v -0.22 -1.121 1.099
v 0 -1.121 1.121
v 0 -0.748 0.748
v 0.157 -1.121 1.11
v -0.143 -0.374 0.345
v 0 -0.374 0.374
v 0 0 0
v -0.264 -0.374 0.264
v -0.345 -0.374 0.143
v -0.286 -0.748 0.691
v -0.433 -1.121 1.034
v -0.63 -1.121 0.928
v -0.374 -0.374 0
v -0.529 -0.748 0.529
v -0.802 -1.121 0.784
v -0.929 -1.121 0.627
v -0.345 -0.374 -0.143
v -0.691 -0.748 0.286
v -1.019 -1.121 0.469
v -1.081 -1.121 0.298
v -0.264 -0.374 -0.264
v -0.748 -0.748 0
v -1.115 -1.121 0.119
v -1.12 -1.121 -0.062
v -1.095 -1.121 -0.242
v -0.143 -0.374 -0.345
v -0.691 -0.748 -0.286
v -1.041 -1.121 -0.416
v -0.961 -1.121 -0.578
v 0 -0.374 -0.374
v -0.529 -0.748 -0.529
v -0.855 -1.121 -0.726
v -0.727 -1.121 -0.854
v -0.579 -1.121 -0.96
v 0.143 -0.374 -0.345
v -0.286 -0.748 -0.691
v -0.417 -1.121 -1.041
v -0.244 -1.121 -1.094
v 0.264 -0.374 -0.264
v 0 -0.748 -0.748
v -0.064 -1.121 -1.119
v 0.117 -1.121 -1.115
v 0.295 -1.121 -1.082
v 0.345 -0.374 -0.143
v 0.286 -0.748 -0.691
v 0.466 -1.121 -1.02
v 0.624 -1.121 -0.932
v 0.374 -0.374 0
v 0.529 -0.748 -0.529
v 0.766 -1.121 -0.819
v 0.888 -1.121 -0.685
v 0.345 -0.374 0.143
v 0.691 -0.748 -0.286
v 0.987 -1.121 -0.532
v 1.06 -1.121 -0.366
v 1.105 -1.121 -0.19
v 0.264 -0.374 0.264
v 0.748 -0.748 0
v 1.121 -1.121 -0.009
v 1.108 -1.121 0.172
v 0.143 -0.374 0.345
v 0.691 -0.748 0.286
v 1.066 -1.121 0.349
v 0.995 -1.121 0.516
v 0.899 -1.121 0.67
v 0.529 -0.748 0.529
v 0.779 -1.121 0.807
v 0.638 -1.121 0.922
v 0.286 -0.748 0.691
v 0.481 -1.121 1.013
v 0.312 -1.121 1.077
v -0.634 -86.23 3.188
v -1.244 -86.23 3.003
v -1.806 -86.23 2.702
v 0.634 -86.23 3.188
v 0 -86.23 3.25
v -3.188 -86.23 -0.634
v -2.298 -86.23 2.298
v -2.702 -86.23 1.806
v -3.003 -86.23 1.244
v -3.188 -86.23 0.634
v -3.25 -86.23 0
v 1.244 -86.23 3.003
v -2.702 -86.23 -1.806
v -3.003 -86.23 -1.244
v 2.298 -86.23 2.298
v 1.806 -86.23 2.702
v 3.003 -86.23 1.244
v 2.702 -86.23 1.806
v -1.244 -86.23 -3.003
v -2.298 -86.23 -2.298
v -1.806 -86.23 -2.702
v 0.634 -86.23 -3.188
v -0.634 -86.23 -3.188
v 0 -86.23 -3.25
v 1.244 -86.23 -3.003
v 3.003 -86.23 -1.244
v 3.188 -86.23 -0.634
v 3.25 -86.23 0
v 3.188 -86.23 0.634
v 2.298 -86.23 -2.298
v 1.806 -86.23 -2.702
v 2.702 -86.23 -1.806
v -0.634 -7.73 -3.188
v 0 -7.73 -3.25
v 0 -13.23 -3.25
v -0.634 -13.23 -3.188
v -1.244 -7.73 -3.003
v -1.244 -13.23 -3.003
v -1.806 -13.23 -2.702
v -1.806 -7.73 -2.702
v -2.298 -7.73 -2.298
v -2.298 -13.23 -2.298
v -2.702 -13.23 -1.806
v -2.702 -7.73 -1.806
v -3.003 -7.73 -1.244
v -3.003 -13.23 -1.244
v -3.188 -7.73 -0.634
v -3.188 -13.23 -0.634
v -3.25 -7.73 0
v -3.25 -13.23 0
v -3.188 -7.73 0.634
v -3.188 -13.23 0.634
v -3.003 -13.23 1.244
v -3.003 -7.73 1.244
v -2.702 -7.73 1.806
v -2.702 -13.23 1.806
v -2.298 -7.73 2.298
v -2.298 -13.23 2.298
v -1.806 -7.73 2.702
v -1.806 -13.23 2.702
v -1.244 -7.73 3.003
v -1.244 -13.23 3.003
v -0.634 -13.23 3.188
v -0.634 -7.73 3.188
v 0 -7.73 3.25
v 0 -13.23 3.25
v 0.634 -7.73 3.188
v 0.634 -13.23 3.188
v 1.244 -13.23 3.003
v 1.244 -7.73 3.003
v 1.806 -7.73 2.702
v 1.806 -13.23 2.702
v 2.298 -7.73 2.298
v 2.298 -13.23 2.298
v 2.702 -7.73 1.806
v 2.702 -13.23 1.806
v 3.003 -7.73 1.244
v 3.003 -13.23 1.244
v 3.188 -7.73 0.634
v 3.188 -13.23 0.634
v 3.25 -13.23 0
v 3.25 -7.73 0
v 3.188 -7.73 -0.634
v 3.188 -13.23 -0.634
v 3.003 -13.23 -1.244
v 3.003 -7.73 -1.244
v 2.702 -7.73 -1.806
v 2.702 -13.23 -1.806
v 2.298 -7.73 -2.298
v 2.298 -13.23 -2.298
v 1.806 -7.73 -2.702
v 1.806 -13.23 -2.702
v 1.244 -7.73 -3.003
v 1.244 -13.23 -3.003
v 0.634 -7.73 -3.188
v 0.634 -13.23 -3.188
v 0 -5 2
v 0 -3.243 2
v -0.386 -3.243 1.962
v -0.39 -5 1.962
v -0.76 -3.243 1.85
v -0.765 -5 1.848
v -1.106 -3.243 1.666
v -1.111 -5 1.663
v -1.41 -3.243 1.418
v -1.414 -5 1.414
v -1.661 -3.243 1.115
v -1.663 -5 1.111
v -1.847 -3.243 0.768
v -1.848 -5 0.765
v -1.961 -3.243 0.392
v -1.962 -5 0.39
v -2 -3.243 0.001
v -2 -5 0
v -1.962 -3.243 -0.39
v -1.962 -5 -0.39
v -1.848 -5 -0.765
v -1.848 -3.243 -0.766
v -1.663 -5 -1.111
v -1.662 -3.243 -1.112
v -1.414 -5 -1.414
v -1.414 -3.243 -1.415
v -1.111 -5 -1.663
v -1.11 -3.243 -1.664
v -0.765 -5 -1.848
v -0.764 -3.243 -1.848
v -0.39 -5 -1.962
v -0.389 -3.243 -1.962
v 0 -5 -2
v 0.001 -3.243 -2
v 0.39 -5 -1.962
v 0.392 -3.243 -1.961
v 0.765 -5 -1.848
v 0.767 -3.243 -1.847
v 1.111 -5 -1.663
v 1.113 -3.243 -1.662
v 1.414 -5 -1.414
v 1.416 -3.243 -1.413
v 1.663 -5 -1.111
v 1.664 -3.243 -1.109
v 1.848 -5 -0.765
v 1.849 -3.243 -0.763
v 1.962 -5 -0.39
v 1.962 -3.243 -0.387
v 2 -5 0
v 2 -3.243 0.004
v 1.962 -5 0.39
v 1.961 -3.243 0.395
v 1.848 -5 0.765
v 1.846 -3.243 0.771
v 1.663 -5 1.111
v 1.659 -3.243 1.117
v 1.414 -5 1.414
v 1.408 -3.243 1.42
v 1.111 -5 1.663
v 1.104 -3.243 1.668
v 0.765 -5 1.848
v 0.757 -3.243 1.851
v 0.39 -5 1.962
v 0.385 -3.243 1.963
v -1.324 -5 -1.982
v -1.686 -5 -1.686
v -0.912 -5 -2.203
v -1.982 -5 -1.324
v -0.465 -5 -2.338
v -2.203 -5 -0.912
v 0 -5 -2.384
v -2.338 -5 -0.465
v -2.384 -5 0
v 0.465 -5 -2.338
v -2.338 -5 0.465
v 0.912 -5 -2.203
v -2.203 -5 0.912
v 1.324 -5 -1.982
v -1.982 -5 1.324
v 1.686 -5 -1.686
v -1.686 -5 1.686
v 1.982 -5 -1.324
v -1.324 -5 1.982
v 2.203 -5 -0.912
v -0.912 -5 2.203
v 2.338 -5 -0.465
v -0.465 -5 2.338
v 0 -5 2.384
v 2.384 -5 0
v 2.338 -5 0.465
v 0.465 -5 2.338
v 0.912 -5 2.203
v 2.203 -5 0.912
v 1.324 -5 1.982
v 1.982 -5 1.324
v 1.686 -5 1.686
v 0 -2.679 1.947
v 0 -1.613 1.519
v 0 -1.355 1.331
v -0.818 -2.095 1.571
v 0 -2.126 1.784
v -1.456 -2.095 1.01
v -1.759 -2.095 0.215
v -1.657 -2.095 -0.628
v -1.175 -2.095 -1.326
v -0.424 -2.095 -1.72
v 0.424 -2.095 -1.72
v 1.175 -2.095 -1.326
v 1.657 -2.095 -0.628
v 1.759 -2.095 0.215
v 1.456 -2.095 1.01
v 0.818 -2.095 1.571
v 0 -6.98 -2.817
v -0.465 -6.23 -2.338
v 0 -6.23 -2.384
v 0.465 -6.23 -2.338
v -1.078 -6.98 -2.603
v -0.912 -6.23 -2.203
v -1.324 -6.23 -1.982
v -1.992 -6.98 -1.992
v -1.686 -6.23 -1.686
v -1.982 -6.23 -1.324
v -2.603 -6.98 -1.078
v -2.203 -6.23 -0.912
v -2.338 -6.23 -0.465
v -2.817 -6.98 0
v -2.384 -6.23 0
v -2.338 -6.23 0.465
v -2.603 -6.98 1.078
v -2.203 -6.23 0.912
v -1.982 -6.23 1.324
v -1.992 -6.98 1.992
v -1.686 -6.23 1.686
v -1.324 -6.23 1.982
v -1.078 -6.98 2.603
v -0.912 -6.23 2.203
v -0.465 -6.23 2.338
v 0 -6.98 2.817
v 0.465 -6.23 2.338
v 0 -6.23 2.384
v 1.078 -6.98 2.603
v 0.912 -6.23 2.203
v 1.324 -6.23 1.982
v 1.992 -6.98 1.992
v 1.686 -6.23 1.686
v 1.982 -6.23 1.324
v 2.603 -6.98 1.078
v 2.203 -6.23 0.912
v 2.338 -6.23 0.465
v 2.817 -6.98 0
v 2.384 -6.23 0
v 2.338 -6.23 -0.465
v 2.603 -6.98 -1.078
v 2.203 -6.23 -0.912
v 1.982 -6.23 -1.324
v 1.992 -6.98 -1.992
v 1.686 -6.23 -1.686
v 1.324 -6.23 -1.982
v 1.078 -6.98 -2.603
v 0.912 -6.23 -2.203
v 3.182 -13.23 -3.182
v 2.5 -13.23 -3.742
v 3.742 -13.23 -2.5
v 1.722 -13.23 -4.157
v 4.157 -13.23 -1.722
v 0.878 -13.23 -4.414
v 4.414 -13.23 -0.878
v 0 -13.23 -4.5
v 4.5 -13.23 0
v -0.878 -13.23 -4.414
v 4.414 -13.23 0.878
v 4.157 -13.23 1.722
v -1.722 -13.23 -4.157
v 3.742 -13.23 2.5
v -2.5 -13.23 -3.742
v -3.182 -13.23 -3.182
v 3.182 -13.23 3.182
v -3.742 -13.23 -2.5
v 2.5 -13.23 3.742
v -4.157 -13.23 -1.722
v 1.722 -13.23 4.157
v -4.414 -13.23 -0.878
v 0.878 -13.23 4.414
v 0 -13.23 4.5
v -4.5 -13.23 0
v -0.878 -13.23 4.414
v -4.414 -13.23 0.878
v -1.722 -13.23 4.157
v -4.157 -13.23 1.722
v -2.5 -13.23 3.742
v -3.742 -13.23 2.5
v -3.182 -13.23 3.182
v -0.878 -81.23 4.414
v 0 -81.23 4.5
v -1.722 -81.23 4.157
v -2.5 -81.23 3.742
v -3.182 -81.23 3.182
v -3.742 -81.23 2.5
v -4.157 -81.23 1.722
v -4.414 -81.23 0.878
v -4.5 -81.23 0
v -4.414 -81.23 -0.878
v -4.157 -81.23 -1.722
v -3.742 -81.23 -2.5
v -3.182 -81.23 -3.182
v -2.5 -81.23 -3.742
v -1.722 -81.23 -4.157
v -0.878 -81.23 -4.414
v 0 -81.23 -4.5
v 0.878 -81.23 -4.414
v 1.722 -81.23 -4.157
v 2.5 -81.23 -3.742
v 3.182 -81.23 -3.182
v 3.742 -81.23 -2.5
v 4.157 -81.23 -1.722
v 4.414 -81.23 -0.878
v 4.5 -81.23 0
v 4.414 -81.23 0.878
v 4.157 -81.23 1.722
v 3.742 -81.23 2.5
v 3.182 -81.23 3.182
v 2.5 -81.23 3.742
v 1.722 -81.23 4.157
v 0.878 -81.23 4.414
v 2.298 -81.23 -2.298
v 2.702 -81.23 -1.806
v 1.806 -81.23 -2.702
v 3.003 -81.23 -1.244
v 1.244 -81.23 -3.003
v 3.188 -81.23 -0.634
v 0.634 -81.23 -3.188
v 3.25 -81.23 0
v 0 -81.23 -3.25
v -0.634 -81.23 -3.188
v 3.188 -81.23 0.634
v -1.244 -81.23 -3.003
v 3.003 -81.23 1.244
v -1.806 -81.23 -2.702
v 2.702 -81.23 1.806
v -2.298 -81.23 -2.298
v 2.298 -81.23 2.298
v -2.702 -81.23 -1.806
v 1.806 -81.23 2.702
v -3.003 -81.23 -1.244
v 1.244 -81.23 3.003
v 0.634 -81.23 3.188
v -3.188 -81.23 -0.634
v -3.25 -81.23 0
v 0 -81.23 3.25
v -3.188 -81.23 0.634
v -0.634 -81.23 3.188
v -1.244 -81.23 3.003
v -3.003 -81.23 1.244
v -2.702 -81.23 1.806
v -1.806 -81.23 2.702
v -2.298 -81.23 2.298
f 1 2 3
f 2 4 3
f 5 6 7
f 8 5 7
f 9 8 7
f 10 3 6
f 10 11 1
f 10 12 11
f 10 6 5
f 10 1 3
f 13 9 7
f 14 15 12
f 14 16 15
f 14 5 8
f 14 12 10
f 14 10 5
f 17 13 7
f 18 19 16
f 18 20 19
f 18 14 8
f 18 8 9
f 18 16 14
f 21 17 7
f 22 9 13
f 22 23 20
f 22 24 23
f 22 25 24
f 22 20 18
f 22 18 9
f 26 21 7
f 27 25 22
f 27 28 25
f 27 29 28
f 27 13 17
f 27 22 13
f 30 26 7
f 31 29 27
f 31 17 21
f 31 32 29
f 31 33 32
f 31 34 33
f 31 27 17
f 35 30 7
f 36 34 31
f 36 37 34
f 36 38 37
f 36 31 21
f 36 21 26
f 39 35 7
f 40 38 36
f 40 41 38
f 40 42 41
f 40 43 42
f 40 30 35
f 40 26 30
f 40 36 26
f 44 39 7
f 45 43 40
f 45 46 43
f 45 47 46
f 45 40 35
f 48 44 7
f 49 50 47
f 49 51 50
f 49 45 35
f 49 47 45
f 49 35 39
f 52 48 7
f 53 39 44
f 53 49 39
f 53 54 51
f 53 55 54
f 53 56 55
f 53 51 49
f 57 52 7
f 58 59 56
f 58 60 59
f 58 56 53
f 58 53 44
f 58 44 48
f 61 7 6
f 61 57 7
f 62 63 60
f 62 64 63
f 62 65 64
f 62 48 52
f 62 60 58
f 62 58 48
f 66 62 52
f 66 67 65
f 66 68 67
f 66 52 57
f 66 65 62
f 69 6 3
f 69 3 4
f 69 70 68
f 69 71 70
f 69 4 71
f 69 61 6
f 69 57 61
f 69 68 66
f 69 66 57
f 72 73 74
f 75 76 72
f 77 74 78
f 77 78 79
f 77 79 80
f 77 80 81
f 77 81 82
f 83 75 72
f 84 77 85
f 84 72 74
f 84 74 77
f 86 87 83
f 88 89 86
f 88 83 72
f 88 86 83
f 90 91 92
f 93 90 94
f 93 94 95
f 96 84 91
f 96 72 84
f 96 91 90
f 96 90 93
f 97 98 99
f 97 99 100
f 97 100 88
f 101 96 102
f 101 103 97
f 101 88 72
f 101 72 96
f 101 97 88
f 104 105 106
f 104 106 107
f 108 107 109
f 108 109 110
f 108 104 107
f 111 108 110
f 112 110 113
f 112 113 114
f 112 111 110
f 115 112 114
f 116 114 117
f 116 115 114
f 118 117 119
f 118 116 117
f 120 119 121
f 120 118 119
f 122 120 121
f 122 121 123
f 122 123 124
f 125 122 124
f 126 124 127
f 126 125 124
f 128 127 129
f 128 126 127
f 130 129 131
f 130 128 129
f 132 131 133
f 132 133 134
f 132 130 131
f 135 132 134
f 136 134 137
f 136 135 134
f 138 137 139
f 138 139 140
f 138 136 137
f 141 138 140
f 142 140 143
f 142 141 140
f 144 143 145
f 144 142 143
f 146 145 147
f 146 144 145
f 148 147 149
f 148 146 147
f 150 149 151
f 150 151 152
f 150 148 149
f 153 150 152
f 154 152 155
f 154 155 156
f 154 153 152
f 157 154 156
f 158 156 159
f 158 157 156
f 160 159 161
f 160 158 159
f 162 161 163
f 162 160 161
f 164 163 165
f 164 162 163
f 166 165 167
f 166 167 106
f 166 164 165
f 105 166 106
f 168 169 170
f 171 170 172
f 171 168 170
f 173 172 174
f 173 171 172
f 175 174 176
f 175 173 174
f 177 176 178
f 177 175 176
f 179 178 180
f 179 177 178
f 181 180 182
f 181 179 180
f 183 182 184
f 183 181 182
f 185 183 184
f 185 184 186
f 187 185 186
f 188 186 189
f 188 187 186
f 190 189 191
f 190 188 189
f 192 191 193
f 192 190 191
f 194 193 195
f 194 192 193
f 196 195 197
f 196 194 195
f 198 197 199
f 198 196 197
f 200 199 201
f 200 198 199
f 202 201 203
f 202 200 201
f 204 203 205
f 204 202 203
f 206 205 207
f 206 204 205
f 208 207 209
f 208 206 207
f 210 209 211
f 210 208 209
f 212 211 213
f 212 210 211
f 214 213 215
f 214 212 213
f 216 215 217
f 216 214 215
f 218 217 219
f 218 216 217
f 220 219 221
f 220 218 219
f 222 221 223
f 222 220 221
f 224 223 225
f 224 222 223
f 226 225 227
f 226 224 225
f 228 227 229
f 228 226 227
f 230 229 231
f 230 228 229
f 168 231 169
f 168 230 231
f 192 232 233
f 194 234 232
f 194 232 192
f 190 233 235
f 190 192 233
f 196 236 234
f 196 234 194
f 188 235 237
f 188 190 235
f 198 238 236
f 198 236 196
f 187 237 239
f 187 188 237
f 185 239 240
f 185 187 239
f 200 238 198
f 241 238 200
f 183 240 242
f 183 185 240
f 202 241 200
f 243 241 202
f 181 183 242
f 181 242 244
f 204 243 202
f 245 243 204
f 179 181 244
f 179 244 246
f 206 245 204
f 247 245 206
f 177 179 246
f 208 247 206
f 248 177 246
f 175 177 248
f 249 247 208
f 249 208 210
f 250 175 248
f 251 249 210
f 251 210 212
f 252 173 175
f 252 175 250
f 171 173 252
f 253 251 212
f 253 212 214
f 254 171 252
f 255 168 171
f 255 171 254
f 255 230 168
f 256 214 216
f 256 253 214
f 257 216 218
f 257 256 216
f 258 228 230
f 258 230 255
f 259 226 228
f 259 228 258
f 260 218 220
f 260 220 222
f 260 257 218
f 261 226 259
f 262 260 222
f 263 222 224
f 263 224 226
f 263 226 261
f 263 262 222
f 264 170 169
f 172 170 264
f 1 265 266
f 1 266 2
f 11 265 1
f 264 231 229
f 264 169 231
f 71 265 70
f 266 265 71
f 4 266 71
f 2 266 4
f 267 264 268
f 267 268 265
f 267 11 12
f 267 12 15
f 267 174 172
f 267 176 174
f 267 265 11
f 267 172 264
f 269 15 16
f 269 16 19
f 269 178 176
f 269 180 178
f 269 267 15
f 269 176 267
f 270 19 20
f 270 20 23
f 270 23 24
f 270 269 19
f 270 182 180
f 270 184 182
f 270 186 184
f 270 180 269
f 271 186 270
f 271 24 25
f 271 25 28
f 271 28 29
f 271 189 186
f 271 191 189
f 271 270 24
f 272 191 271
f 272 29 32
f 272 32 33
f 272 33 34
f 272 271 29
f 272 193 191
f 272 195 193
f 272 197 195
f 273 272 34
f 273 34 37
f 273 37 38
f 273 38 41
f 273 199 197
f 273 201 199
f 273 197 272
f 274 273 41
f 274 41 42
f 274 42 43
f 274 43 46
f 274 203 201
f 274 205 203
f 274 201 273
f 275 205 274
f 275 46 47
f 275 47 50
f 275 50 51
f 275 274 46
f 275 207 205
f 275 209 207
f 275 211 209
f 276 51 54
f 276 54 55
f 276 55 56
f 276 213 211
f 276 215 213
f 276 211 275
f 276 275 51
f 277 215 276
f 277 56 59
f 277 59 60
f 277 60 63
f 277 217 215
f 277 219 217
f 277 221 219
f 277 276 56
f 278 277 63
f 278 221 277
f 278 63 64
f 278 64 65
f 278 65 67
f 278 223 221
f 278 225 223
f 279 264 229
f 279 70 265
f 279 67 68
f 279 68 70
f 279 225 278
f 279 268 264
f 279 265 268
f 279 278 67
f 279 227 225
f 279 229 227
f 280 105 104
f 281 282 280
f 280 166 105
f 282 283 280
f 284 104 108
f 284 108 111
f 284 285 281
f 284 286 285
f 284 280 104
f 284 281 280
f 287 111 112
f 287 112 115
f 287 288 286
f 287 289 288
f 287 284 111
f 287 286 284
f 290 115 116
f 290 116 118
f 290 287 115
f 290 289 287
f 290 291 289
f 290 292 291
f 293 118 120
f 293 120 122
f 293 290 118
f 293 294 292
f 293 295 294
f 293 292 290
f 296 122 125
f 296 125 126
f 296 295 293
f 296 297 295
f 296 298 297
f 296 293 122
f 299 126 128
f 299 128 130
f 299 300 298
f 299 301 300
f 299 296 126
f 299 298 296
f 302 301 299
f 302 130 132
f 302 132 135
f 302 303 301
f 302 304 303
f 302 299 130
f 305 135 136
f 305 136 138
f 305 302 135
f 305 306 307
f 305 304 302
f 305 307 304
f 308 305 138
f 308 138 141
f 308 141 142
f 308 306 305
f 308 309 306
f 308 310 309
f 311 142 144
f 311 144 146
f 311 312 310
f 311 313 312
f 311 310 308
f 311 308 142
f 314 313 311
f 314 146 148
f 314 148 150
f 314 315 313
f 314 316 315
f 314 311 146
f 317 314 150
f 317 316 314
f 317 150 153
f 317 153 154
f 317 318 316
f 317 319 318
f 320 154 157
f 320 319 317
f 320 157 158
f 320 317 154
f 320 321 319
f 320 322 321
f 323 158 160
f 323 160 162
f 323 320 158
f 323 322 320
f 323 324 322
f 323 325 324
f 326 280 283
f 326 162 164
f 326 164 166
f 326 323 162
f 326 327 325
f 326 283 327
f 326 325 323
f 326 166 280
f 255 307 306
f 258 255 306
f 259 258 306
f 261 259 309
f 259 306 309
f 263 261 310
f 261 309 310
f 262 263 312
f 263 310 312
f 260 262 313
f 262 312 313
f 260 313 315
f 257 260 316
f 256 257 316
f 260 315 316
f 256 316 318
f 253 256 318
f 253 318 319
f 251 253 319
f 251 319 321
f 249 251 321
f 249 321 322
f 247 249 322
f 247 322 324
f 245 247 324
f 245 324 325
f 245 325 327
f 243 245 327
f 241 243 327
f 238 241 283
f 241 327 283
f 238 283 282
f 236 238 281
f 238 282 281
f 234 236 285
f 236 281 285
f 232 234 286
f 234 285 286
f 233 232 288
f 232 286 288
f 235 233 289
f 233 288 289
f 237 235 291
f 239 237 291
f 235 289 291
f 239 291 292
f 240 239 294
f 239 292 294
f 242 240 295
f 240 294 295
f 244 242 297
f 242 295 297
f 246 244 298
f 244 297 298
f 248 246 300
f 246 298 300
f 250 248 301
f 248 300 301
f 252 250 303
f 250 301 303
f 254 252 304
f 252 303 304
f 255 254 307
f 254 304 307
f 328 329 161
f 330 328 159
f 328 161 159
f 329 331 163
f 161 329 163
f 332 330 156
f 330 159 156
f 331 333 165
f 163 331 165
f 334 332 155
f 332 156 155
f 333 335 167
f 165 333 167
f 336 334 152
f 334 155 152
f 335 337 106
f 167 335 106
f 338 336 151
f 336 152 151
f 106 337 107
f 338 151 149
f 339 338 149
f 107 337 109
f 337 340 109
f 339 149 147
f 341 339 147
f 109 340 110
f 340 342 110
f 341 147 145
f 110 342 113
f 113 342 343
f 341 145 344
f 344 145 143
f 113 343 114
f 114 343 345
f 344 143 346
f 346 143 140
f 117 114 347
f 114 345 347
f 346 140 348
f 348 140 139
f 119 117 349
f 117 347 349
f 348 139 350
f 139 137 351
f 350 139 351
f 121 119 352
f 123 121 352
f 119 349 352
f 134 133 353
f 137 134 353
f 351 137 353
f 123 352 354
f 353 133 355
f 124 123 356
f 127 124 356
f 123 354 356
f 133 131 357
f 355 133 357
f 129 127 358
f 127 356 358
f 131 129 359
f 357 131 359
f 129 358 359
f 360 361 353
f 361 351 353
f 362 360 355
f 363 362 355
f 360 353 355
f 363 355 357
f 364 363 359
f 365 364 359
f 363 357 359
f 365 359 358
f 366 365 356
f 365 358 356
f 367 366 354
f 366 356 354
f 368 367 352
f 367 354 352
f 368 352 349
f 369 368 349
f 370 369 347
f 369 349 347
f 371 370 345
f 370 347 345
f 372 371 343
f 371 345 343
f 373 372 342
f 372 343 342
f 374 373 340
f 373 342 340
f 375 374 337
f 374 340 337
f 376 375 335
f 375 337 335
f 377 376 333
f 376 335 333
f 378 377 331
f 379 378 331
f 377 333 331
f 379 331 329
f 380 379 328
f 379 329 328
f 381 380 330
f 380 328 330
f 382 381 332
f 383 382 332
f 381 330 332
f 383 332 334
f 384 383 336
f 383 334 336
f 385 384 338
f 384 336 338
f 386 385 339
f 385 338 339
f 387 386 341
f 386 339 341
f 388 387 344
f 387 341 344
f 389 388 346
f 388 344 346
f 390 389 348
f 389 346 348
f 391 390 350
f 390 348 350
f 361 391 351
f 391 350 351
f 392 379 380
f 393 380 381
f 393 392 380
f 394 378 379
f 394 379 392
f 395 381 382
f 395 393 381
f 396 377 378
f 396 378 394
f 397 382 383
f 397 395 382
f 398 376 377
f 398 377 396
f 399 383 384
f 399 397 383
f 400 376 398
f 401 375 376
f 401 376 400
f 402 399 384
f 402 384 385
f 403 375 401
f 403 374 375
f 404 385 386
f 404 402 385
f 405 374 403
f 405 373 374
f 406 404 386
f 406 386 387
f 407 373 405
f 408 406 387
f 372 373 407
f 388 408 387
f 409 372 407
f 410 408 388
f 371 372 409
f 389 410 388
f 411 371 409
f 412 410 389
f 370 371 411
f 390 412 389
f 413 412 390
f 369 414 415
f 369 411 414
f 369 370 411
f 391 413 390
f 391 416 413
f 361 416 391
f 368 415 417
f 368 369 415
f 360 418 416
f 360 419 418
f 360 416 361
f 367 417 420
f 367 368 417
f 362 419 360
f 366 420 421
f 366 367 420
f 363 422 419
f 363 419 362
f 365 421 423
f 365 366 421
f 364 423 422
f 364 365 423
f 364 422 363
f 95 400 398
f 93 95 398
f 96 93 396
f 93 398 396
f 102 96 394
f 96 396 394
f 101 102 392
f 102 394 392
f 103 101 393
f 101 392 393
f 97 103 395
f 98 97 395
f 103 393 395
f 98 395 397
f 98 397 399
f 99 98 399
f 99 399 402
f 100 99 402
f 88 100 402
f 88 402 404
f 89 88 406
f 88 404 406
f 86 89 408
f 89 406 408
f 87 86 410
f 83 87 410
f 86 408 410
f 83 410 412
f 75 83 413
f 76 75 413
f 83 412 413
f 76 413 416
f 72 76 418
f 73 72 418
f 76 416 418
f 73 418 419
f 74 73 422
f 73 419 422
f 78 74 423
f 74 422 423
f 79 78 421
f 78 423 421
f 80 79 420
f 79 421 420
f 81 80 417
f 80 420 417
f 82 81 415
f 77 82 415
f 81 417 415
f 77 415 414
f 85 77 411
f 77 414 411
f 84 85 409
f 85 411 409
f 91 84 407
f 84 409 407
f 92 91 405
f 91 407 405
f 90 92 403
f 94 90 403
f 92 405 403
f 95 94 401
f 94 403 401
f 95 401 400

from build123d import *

# Parameters (mm, degrees)
SKETCH1_W           = 4.5
SKETCH1_H           = 68
SKETCH2_R           = 3.25
BOSS_EXTRUDE1_DEPTH = 5
BOSS_EXTRUDE2_START = 7
SKETCH3_R           = 3.25
BOSS_EXTRUDE2_DEPTH = 7
CHAMFER1_SIZE       = 1.5
CHAMFER1_SIZE2      = 0.866025404
SKETCH4_R           = 2.383974596
BOSS_EXTRUDE3_DEPTH = 1.23
FILLET1_R           = 3


with BuildPart() as part:
    # Sketch1 → Revolve1 (revolve)
    with BuildSketch(Plane.XY, mode=Mode.PRIVATE) as revolve1_sk:
        with Locations((-2.25, 0)):
            Rectangle(SKETCH1_W, SKETCH1_H)
    revolve(revolve1_sk.sketch.rotate(Axis((0, 43.52476671, 0), (0, -1, 0)), 270), axis=Axis((0, 43.52476671, 0), (0, -1, 0)))

    # Sketch2 → Boss-Extrude1 (add)
    with BuildSketch(Plane.XZ.offset(34)):
        with Locations(Location((0, 0, 0), (0, 0, 270))):
            Circle(SKETCH2_R)
    extrude(amount=BOSS_EXTRUDE1_DEPTH)

    # Sketch3 → Boss-Extrude2 (add)
    with BuildSketch(Plane(origin=(0, 34, 0), x_dir=(1, 0, 0), z_dir=(0, 1, 0)).offset(BOSS_EXTRUDE2_START)):
        with Locations(Location((0, 0, 0), (0, 0, 90))):
            Circle(SKETCH3_R)
    extrude(amount=-BOSS_EXTRUDE2_DEPTH)

    # Chamfer1
    chamfer1_edges = [part.edges().sort_by_distance(p)[0] for p in [
        (0, 41, 3.25),
    ]]
    chamfer1_side = [part.faces().sort_by_distance(p)[0] for p in [
        (0, 37.5, 3.25),
    ]]
    chamfer(chamfer1_edges, length=CHAMFER1_SIZE, length2=CHAMFER1_SIZE2, reference=chamfer1_side[0])

    # Sketch4 → Boss-Extrude3 (add)
    with BuildSketch(Plane(origin=(0, 41, 0), x_dir=(1, 0, 0), z_dir=(0, 1, 0))):
        with Locations(Location((0, 0, 0), (0, 0, 270))):
            Circle(SKETCH4_R)
    extrude(amount=BOSS_EXTRUDE3_DEPTH)

    # Sketch5 → Revolve2 (revolve)
    with BuildSketch(Plane(origin=(0, 0, 0), x_dir=(0, 0, -1), z_dir=(1, 0, 0))):
        Polygon((0, 47.23), (-2, 45.23), (-2, 42.23), (0, 42.23), align=None)
    revolve(axis=Axis((0, 53.154384726, 0), (0, -1, 0)))

    # Fillet1
    fillet1_edges = [part.edges().sort_by_distance(p)[0] for p in [
        (0, 45.23, -2),
    ]]
    fillet(fillet1_edges, radius=FILLET1_R)


with BuildPart() as part_1:
    # Body-Move/Copy1: moved
    add(part.part.moved(Location((0, -47.23, 0))))


solid = part_1.part
